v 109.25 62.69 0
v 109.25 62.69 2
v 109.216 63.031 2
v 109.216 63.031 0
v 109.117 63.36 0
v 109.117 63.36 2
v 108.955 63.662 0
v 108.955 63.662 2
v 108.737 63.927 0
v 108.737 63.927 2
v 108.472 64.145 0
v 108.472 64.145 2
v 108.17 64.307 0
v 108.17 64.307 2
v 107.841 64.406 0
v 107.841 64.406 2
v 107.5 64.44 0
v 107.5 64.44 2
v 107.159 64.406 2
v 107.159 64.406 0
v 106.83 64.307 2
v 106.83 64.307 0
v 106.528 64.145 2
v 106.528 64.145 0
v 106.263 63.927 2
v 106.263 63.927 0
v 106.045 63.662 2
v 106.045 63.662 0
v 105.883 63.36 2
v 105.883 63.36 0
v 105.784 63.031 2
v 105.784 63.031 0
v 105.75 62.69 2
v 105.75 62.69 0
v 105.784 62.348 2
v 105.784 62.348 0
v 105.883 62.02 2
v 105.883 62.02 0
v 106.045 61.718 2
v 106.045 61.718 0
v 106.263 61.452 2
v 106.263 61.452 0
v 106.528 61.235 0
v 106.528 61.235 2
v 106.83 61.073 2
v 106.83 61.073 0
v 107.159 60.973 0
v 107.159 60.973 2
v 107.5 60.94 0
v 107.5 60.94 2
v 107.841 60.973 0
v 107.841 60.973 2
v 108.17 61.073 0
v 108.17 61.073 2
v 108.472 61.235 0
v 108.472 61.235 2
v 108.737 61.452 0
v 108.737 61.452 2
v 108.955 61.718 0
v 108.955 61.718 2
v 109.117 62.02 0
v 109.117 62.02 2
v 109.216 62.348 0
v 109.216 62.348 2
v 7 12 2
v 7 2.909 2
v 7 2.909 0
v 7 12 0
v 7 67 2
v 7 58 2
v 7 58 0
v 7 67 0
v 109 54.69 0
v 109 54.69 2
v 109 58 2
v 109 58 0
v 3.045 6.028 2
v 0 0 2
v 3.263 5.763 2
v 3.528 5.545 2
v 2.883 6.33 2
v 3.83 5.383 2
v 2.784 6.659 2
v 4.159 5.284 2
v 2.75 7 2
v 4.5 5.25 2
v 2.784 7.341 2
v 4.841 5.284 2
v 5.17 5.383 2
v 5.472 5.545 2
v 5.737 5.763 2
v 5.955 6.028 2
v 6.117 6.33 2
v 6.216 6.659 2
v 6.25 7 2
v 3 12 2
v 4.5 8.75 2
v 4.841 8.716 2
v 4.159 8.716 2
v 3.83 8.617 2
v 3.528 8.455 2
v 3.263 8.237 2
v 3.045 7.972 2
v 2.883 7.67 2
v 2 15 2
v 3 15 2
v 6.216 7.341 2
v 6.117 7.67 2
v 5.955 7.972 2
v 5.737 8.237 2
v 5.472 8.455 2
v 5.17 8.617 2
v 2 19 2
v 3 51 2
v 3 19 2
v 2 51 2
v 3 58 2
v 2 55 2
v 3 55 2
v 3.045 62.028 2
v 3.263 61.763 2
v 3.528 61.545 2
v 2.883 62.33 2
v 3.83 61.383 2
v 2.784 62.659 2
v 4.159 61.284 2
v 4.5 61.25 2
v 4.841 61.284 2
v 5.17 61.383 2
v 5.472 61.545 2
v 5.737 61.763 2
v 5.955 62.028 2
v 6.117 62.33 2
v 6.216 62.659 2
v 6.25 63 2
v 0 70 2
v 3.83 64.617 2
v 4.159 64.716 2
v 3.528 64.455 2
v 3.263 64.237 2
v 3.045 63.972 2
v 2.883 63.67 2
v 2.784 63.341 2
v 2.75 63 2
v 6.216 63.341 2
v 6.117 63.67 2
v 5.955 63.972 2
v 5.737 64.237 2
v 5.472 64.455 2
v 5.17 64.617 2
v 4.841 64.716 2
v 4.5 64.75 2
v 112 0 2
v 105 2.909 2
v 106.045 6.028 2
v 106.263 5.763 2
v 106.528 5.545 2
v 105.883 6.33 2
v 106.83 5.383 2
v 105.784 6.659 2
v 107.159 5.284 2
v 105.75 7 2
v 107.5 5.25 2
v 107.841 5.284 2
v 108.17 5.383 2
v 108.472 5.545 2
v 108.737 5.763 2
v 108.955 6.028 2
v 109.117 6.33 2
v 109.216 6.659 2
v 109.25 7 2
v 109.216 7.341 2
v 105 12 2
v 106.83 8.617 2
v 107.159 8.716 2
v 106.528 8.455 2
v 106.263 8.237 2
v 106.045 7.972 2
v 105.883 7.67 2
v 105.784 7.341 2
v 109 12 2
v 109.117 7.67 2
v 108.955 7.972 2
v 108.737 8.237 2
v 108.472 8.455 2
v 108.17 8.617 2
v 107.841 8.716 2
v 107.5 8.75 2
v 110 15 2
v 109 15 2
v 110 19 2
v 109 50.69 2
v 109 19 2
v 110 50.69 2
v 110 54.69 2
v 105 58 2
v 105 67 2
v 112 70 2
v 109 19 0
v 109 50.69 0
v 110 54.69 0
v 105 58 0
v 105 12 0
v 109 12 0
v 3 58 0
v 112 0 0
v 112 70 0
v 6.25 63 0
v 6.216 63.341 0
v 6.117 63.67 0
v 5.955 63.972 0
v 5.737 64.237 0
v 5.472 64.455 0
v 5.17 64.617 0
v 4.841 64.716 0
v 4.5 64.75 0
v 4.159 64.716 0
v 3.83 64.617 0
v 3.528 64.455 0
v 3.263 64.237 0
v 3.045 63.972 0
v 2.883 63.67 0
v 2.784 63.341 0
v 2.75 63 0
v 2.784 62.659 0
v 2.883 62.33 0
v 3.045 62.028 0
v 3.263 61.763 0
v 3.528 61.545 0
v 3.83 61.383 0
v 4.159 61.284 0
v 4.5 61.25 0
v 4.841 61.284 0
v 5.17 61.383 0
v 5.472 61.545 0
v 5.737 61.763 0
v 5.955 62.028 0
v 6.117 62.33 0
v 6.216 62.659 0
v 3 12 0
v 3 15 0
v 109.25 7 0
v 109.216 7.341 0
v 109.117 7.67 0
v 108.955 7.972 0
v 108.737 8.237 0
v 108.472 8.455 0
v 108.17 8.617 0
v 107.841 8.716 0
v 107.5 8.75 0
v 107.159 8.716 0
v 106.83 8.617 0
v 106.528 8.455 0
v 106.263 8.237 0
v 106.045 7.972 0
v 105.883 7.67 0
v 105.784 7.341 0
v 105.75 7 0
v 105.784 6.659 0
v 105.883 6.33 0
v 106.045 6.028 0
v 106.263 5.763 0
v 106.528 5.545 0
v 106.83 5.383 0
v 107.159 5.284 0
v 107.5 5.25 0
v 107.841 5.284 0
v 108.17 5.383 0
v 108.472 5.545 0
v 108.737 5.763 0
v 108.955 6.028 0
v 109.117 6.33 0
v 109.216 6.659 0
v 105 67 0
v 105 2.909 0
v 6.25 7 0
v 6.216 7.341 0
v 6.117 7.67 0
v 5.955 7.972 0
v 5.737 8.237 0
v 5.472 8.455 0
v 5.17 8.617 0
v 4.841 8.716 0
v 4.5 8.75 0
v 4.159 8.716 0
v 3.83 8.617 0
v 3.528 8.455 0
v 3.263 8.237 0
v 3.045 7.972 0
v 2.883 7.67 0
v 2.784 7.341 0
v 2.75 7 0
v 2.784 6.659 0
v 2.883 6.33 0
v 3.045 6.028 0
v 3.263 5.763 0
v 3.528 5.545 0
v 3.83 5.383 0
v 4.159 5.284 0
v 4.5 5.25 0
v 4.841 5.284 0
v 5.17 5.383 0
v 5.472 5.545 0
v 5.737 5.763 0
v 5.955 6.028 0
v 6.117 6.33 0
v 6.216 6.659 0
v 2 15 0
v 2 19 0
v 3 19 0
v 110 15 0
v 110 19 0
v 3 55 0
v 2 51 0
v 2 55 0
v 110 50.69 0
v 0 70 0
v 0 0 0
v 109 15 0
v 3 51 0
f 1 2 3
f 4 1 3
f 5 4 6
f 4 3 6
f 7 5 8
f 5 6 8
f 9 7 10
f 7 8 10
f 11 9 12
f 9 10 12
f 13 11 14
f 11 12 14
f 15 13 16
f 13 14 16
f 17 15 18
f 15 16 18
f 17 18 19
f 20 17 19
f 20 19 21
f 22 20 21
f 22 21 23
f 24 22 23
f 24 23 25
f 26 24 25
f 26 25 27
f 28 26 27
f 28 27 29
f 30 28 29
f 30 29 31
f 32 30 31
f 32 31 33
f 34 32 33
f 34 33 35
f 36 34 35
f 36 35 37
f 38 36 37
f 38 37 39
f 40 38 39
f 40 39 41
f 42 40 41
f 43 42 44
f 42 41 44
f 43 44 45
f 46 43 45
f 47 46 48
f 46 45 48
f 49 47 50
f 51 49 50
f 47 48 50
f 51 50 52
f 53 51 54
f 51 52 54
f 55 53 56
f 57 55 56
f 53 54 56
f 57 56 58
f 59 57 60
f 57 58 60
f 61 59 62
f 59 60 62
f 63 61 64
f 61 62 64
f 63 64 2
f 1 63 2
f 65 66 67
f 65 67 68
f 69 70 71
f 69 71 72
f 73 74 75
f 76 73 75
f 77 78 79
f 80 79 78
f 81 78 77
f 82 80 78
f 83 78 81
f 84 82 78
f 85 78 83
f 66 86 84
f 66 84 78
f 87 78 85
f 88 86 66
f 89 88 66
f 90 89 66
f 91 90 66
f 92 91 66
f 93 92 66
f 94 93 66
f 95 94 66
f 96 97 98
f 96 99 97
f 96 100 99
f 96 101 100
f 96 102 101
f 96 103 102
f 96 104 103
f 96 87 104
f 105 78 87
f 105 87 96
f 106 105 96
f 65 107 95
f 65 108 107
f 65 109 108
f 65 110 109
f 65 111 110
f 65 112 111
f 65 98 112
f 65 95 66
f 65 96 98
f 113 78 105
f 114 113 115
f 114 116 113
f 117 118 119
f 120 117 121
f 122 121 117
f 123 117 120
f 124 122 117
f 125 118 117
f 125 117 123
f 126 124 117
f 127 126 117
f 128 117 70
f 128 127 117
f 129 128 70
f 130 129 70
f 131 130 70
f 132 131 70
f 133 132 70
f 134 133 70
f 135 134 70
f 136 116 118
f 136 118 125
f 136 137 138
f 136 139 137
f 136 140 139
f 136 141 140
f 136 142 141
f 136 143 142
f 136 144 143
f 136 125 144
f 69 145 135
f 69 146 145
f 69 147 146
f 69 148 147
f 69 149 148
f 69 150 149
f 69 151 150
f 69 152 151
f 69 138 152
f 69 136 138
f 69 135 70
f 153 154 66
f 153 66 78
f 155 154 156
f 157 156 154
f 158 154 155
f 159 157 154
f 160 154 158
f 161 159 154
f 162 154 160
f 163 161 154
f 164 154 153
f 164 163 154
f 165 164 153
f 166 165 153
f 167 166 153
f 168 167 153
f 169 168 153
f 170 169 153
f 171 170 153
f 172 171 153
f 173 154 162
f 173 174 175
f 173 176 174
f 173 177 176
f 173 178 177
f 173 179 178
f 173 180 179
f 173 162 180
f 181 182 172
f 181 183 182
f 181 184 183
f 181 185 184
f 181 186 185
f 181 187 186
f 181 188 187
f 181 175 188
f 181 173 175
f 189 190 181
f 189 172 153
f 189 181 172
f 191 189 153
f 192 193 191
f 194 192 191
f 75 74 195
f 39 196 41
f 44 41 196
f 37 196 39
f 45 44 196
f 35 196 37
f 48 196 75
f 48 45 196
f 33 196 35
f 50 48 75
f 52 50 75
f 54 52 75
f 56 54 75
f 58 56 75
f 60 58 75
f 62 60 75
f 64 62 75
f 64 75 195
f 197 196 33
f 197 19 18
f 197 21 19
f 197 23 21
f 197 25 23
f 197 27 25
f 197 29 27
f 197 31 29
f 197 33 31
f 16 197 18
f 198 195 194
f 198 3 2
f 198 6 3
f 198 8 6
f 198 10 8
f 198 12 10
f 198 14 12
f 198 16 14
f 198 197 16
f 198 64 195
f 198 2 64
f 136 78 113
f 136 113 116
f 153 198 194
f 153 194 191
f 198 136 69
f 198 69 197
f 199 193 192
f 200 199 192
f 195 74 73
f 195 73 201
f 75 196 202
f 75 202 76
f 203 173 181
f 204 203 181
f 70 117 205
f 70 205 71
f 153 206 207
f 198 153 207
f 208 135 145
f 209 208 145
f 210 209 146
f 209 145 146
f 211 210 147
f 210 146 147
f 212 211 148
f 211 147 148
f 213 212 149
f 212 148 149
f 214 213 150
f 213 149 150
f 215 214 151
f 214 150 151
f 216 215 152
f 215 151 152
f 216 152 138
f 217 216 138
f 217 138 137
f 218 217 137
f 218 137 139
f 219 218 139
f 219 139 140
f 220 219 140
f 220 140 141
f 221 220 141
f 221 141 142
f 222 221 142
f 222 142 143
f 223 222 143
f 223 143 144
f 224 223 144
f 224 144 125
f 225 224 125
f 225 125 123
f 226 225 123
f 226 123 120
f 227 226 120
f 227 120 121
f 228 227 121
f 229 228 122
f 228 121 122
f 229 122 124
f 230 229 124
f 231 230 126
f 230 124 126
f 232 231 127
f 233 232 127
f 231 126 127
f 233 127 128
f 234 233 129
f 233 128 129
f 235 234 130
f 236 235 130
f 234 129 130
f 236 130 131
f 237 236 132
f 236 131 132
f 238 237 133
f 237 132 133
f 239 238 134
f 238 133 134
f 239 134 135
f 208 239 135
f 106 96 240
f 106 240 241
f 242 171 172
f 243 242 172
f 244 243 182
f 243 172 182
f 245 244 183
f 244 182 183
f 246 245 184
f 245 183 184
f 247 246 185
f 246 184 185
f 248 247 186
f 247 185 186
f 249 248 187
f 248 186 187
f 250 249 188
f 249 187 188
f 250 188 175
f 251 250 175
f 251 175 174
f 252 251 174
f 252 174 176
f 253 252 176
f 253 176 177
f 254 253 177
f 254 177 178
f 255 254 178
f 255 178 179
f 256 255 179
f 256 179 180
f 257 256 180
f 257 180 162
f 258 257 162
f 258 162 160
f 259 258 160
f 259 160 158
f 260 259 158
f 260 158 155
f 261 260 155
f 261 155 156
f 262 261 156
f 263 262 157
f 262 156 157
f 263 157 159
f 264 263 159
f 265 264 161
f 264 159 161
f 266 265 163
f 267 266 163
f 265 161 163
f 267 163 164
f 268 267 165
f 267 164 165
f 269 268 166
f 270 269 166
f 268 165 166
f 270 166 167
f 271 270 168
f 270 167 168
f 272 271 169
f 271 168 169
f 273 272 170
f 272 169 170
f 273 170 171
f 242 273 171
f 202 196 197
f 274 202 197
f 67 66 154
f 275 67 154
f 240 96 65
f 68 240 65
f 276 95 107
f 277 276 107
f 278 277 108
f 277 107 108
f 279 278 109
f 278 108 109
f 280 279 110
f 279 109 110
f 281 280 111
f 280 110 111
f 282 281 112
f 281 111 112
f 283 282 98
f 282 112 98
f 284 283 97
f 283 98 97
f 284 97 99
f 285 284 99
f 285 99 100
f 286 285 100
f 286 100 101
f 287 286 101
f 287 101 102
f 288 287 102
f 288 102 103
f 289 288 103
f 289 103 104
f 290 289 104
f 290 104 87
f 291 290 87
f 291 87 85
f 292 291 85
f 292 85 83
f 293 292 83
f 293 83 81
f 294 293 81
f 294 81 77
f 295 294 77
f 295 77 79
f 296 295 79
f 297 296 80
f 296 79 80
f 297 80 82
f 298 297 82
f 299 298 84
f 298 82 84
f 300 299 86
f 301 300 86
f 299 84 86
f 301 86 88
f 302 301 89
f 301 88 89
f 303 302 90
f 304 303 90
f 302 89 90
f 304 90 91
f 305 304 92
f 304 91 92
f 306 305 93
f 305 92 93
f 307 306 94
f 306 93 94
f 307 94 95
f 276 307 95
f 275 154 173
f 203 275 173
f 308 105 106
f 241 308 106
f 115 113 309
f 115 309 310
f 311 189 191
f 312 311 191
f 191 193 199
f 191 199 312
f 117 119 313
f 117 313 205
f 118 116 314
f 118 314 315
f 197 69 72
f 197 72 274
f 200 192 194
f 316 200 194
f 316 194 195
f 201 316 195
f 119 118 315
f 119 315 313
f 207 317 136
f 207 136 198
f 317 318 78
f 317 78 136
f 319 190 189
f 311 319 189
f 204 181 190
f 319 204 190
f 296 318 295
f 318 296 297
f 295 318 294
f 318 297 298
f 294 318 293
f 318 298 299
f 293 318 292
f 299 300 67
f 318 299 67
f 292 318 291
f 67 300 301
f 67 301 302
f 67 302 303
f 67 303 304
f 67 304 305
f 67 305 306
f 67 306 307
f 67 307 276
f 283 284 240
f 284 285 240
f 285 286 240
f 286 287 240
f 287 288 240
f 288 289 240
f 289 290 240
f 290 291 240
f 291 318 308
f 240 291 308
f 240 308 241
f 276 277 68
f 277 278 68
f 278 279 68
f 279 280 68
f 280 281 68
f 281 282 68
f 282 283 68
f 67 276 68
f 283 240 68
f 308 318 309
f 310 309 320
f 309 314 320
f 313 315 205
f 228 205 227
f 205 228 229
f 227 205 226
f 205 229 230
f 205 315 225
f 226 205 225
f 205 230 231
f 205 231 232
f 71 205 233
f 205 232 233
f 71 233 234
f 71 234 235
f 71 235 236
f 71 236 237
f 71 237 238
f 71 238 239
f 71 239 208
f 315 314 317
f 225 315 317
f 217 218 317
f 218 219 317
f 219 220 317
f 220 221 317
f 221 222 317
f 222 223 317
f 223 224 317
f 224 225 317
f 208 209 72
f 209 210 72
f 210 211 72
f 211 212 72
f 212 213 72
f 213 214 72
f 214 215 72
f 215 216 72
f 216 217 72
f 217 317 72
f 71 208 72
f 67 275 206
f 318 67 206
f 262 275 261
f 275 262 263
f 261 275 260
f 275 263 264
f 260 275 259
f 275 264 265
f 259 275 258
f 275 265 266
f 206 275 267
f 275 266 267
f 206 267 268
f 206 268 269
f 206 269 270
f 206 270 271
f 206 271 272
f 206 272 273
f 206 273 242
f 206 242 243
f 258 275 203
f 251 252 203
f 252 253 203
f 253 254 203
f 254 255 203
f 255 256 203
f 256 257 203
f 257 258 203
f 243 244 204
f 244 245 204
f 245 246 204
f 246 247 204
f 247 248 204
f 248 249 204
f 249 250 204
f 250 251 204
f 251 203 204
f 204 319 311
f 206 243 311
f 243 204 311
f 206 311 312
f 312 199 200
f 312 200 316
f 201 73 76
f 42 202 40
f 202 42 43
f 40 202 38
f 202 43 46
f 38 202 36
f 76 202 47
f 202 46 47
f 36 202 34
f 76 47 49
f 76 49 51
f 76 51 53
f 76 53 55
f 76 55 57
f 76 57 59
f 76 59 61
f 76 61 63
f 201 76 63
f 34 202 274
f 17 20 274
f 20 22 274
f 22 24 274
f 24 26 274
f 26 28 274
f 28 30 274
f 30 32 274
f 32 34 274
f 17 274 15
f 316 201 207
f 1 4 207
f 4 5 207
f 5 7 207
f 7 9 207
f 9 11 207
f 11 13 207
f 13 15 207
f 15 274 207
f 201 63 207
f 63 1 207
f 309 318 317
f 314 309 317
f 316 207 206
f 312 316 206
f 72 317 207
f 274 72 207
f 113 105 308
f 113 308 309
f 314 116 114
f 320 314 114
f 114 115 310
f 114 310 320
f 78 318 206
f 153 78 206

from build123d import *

# Parameters (mm, degrees)
SKETCH1_W           = 112
SKETCH1_H           = 70
BOSS_EXTRUDE1_DEPTH = 2
SKETCH2_W           = 98
SKETCH2_H           = 64.091260174
CUT_EXTRUDE1_DEPTH  = 133.090877808
SKETCH3_W           = 4
SKETCH3_H           = 46
CUT_EXTRUDE2_DEPTH  = 133.090877808
SKETCH4_R           = 1.75
SKETCH4_W           = 1
SKETCH4_H           = 4
CUT_EXTRUDE3_DEPTH  = 133.090877808


with BuildPart() as part:
    # Sketch1 → Boss-Extrude1 (new body)
    with BuildSketch(Plane.XY):
        with Locations((56, 35)):
            Rectangle(SKETCH1_W, SKETCH1_H)
    extrude(amount=BOSS_EXTRUDE1_DEPTH)

    # Sketch2 → Cut-Extrude1 (cut, through all)
    with BuildSketch(Plane.XY.offset(2)):
        with Locations((56, 34.954369913)):
            Rectangle(SKETCH2_W, SKETCH2_H)
    extrude(amount=-CUT_EXTRUDE1_DEPTH, mode=Mode.SUBTRACT)

    # Sketch3 → Cut-Extrude2 (cut, through all)
    with BuildSketch(Plane.XY.offset(2)):
        with Locations((5, 35)):
            Rectangle(SKETCH3_W, SKETCH3_H)
        with Locations((107, 35)):
            Rectangle(SKETCH3_W, SKETCH3_H)
    extrude(amount=-CUT_EXTRUDE2_DEPTH, mode=Mode.SUBTRACT)

    # Sketch4 → Cut-Extrude3 (cut, through all)
    with BuildSketch(Plane.XY.offset(2)):
        with Locations((4.5, 63)):
            Circle(SKETCH4_R)
        with Locations((4.5, 7)):
            Circle(SKETCH4_R)
        with Locations((107.5, 7)):
            Circle(SKETCH4_R)
        with Locations((107.5, 62.689831266)):
            Circle(SKETCH4_R)
        with Locations((2.5, 53)):
            Rectangle(SKETCH4_W, SKETCH4_H)
        with Locations((2.5, 17)):
            Rectangle(SKETCH4_W, SKETCH4_H)
        with Locations((109.5, 52.689831266)):
            Rectangle(SKETCH4_W, SKETCH4_H)
        with Locations((109.5, 17)):
            Rectangle(SKETCH4_W, SKETCH4_H)
    extrude(amount=-CUT_EXTRUDE3_DEPTH, mode=Mode.SUBTRACT)


solid = part.part
